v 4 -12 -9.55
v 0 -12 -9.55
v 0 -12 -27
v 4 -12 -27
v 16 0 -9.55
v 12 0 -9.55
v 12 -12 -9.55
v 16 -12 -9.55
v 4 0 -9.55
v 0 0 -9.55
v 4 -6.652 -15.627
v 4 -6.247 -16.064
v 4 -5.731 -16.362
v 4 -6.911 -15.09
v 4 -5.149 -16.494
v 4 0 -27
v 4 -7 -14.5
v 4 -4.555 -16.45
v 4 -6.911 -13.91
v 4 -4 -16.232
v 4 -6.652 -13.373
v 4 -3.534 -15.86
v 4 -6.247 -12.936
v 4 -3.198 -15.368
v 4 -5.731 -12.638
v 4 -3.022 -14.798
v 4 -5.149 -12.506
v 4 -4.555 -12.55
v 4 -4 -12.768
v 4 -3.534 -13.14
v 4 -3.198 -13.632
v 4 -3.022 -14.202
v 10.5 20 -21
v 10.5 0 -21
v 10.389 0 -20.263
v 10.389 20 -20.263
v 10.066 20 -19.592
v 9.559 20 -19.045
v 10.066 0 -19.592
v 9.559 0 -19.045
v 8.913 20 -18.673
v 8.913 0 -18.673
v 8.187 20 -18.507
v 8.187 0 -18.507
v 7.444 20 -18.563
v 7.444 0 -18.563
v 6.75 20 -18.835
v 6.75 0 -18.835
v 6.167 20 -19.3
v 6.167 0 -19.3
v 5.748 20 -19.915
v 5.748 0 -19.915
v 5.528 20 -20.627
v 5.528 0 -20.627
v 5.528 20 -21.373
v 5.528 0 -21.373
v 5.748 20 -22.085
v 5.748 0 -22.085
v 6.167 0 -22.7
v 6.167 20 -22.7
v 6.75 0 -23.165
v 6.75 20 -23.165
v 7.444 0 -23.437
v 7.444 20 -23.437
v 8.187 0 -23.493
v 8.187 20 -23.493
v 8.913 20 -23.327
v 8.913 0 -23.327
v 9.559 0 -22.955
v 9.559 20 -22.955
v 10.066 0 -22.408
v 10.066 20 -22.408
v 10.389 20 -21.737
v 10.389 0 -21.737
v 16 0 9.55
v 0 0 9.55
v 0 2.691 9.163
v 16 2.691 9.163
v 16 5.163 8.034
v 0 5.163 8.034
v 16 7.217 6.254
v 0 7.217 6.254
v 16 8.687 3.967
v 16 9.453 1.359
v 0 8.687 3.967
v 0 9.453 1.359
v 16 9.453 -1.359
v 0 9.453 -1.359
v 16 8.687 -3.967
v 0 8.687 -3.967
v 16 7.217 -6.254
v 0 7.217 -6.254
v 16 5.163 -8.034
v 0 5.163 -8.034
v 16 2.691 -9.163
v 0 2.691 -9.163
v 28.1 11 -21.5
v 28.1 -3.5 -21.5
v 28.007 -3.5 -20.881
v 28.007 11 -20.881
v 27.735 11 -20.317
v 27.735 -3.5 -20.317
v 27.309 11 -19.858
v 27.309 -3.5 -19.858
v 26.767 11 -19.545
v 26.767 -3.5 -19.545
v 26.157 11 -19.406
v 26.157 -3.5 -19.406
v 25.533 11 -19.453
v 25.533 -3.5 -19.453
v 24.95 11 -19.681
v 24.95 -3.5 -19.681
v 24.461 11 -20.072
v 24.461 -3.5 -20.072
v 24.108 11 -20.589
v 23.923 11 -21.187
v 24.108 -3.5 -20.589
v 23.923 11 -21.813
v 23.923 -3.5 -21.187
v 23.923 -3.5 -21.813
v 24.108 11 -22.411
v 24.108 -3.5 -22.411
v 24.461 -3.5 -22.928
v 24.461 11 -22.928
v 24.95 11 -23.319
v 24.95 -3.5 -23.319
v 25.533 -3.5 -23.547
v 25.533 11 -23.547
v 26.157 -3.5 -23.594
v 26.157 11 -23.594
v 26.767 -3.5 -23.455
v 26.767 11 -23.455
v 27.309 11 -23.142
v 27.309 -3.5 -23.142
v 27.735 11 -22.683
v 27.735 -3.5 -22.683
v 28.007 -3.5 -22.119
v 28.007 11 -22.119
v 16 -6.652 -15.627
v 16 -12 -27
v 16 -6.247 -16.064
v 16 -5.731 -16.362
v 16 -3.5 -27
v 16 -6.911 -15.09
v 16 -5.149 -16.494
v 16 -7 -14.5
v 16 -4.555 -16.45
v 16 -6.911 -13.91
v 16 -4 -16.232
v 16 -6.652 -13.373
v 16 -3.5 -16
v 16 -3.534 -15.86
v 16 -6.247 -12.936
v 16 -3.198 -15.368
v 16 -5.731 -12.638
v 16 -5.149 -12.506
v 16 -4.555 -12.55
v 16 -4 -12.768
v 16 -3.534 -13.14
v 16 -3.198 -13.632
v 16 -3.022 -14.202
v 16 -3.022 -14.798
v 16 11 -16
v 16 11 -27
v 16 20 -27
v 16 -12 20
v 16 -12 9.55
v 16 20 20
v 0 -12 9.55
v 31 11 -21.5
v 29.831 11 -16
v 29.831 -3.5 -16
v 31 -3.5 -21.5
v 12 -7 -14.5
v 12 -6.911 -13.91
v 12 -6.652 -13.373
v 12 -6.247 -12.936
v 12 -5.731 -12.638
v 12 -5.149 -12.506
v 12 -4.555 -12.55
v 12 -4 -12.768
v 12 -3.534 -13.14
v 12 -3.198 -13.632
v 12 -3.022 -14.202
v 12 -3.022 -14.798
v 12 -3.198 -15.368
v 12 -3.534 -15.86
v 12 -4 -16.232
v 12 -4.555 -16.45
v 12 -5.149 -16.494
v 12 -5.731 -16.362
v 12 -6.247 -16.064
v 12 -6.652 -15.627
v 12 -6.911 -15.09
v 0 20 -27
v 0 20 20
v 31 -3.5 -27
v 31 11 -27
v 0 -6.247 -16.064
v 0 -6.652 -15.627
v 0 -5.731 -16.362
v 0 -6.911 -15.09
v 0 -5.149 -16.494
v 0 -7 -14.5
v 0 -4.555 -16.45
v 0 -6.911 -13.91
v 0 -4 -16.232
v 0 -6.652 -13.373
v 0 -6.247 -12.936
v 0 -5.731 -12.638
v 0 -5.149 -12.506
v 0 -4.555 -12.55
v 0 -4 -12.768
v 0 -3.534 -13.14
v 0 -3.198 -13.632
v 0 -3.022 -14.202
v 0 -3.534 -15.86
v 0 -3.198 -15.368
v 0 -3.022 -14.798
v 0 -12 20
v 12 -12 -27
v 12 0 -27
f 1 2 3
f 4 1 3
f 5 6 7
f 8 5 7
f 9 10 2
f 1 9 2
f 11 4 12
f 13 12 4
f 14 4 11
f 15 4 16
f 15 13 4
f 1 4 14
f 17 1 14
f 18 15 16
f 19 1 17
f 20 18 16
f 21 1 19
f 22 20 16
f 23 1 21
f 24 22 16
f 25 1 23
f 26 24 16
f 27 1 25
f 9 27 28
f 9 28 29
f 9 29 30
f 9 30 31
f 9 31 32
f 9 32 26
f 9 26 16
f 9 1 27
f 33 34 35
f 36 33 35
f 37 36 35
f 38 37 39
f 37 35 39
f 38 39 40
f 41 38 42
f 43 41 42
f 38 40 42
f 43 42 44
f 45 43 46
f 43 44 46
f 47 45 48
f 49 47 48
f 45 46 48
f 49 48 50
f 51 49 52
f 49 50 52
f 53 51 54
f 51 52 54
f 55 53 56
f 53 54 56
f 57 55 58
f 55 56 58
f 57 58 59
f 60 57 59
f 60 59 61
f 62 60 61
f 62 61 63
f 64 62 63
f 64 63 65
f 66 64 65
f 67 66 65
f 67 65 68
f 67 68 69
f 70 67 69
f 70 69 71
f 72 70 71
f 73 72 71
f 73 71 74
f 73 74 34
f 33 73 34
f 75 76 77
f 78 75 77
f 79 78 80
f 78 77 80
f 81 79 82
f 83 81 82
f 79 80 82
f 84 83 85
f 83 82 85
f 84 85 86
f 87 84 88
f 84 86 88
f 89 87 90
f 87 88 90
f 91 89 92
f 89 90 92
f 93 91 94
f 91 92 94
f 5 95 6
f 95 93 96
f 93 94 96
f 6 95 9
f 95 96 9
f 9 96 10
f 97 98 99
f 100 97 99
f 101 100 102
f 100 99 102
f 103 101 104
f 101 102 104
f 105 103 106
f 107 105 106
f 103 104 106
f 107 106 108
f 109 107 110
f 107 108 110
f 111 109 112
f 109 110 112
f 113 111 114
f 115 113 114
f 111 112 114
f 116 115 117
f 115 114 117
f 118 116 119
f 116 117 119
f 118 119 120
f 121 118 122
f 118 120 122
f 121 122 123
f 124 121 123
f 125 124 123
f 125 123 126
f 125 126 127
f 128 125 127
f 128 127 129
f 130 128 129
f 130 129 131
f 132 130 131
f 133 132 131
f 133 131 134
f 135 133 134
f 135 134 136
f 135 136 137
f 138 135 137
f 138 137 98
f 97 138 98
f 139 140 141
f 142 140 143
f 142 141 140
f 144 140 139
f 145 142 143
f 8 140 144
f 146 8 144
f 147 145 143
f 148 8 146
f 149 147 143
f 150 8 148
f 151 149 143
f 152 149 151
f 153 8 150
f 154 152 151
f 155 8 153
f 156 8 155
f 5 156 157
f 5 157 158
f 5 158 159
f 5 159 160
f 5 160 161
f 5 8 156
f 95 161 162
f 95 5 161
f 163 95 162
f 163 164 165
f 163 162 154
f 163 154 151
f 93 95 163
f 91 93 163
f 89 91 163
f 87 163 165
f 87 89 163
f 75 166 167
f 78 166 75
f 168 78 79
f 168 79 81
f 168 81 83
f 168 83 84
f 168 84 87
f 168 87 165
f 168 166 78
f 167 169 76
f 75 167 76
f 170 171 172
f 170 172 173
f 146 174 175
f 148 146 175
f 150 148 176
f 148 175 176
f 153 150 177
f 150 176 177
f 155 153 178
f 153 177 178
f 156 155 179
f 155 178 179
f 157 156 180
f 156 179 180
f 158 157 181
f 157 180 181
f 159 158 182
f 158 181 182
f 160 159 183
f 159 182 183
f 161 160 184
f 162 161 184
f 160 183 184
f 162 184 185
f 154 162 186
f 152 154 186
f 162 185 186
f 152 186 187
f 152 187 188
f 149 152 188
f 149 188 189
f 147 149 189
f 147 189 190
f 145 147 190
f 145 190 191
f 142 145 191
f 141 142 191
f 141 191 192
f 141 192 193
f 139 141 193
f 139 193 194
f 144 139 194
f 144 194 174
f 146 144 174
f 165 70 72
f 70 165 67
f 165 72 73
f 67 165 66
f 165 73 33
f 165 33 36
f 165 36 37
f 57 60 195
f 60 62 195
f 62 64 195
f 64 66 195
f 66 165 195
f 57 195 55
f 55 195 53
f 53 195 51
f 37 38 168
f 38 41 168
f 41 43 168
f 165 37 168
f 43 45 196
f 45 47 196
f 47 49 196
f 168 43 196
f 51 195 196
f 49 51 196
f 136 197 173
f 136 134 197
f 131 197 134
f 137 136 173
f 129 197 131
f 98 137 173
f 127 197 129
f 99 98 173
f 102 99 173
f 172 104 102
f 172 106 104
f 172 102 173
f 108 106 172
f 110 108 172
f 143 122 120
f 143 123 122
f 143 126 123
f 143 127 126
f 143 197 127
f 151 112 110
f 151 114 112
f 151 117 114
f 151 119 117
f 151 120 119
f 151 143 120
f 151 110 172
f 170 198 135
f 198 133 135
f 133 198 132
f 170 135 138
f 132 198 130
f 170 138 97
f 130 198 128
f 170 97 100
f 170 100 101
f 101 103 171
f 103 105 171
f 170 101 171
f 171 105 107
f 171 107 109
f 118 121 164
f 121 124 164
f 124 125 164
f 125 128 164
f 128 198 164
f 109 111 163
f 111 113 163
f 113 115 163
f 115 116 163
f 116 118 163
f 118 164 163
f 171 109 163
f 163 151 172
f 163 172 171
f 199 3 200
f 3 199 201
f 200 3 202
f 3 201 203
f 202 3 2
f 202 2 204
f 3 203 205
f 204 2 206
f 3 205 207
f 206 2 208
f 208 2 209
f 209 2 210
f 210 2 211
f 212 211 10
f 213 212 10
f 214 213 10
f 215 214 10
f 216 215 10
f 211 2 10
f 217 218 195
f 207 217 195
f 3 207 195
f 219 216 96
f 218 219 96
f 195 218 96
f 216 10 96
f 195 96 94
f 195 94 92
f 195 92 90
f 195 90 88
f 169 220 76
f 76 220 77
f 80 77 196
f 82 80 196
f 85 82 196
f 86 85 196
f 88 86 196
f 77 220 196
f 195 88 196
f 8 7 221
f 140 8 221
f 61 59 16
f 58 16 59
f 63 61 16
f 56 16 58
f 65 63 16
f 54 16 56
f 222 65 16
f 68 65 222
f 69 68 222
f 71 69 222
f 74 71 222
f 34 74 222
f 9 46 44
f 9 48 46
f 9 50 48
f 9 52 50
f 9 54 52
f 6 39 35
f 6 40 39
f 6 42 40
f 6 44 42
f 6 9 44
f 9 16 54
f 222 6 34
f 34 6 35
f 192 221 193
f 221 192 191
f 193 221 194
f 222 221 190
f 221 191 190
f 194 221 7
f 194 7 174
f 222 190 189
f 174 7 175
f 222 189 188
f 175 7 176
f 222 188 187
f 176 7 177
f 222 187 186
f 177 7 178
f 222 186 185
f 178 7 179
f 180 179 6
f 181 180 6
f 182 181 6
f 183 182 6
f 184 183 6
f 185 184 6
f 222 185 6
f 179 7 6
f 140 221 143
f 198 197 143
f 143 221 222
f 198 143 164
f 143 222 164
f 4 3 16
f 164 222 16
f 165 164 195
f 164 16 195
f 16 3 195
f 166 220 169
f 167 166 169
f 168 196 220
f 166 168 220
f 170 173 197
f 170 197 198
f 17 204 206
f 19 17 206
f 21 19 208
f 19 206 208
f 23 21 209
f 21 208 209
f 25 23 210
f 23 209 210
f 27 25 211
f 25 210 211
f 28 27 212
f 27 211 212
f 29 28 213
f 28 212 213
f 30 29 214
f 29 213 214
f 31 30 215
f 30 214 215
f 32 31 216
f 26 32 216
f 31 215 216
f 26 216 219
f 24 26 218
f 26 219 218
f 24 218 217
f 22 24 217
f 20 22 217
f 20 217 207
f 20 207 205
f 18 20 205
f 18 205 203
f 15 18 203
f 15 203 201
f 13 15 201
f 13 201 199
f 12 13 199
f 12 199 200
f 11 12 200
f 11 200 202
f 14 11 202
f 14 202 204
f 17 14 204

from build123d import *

# Parameters (mm, degrees)
F1_DEPTH  = 16
F2_W      = 14.5
F2_H      = 11
F3_DEPTH  = 15
F5_DEPTH  = 23.501
F7_D      = 4.2
F8_W      = 8
F8_H      = 12
F9_DEPTH  = 17.451
F10_R     = 2
F11_DEPTH = 31.001
F14_D     = 5


with BuildPart() as f1:
    # F0 (on Right) → F1 (new body)
    with BuildSketch(Plane.YZ):
        with BuildLine():
            ThreePointArc((0, 9.55), (9.55, 0), (0, -9.55))
            Line((0, -9.55), (-12, -9.55))
            Line((-12, -9.55), (-12, -27))
            Line((-12, -27), (20, -27))
            Line((20, -27), (20, 20))
            Line((20, 20), (-12, 20))
            Line((-12, 20), (-12, 9.55))
            Line((-12, 9.55), (0, 9.55))
        make_face()
    extrude(amount=F1_DEPTH)

    # F2 (on face) → F3 (join)
    with BuildSketch(Plane.YZ.offset(16)):
        with Locations((3.75, -21.5)):
            Rectangle(F2_W, F2_H)
    extrude(amount=F3_DEPTH)

    # F4 (on face) → F5 (cut, through all)
    with BuildSketch(Plane.XZ.offset(3.5)):
        Polygon((29.8309389108, -16), (31, -21.5), (31, -16), align=None)
    extrude(amount=-F5_DEPTH, mode=Mode.SUBTRACT)

    # F7 (through all)
    with Locations(Plane(origin=(0, 11, 0), x_dir=(-1, 0, 0), z_dir=(0, 1, 0))):
        with Locations((-26, -21.5)):
            Hole(F7_D / 2)

    # F8 (on face) → F9 (cut, through all)
    with BuildSketch(Plane.XY.offset(-9.55)):
        with Locations((8, -6)):
            Rectangle(F8_W, F8_H)
    extrude(amount=-F9_DEPTH, mode=Mode.SUBTRACT)

    # F10 (on face) → F11 (cut, through all)
    with BuildSketch(Plane(origin=(0, 0, 0), x_dir=(0, -1, 0), z_dir=(-1, 0, 0))):
        with Locations((5, -14.5)):
            Circle(F10_R)
    extrude(amount=-F11_DEPTH, mode=Mode.SUBTRACT)

    # F14 (through all)
    with Locations(Plane(origin=(0, 20, 0), x_dir=(-1, 0, 0), z_dir=(0, 1, 0))):
        with Locations((-8, -21)):
            Hole(F14_D / 2)


solid = f1.part
